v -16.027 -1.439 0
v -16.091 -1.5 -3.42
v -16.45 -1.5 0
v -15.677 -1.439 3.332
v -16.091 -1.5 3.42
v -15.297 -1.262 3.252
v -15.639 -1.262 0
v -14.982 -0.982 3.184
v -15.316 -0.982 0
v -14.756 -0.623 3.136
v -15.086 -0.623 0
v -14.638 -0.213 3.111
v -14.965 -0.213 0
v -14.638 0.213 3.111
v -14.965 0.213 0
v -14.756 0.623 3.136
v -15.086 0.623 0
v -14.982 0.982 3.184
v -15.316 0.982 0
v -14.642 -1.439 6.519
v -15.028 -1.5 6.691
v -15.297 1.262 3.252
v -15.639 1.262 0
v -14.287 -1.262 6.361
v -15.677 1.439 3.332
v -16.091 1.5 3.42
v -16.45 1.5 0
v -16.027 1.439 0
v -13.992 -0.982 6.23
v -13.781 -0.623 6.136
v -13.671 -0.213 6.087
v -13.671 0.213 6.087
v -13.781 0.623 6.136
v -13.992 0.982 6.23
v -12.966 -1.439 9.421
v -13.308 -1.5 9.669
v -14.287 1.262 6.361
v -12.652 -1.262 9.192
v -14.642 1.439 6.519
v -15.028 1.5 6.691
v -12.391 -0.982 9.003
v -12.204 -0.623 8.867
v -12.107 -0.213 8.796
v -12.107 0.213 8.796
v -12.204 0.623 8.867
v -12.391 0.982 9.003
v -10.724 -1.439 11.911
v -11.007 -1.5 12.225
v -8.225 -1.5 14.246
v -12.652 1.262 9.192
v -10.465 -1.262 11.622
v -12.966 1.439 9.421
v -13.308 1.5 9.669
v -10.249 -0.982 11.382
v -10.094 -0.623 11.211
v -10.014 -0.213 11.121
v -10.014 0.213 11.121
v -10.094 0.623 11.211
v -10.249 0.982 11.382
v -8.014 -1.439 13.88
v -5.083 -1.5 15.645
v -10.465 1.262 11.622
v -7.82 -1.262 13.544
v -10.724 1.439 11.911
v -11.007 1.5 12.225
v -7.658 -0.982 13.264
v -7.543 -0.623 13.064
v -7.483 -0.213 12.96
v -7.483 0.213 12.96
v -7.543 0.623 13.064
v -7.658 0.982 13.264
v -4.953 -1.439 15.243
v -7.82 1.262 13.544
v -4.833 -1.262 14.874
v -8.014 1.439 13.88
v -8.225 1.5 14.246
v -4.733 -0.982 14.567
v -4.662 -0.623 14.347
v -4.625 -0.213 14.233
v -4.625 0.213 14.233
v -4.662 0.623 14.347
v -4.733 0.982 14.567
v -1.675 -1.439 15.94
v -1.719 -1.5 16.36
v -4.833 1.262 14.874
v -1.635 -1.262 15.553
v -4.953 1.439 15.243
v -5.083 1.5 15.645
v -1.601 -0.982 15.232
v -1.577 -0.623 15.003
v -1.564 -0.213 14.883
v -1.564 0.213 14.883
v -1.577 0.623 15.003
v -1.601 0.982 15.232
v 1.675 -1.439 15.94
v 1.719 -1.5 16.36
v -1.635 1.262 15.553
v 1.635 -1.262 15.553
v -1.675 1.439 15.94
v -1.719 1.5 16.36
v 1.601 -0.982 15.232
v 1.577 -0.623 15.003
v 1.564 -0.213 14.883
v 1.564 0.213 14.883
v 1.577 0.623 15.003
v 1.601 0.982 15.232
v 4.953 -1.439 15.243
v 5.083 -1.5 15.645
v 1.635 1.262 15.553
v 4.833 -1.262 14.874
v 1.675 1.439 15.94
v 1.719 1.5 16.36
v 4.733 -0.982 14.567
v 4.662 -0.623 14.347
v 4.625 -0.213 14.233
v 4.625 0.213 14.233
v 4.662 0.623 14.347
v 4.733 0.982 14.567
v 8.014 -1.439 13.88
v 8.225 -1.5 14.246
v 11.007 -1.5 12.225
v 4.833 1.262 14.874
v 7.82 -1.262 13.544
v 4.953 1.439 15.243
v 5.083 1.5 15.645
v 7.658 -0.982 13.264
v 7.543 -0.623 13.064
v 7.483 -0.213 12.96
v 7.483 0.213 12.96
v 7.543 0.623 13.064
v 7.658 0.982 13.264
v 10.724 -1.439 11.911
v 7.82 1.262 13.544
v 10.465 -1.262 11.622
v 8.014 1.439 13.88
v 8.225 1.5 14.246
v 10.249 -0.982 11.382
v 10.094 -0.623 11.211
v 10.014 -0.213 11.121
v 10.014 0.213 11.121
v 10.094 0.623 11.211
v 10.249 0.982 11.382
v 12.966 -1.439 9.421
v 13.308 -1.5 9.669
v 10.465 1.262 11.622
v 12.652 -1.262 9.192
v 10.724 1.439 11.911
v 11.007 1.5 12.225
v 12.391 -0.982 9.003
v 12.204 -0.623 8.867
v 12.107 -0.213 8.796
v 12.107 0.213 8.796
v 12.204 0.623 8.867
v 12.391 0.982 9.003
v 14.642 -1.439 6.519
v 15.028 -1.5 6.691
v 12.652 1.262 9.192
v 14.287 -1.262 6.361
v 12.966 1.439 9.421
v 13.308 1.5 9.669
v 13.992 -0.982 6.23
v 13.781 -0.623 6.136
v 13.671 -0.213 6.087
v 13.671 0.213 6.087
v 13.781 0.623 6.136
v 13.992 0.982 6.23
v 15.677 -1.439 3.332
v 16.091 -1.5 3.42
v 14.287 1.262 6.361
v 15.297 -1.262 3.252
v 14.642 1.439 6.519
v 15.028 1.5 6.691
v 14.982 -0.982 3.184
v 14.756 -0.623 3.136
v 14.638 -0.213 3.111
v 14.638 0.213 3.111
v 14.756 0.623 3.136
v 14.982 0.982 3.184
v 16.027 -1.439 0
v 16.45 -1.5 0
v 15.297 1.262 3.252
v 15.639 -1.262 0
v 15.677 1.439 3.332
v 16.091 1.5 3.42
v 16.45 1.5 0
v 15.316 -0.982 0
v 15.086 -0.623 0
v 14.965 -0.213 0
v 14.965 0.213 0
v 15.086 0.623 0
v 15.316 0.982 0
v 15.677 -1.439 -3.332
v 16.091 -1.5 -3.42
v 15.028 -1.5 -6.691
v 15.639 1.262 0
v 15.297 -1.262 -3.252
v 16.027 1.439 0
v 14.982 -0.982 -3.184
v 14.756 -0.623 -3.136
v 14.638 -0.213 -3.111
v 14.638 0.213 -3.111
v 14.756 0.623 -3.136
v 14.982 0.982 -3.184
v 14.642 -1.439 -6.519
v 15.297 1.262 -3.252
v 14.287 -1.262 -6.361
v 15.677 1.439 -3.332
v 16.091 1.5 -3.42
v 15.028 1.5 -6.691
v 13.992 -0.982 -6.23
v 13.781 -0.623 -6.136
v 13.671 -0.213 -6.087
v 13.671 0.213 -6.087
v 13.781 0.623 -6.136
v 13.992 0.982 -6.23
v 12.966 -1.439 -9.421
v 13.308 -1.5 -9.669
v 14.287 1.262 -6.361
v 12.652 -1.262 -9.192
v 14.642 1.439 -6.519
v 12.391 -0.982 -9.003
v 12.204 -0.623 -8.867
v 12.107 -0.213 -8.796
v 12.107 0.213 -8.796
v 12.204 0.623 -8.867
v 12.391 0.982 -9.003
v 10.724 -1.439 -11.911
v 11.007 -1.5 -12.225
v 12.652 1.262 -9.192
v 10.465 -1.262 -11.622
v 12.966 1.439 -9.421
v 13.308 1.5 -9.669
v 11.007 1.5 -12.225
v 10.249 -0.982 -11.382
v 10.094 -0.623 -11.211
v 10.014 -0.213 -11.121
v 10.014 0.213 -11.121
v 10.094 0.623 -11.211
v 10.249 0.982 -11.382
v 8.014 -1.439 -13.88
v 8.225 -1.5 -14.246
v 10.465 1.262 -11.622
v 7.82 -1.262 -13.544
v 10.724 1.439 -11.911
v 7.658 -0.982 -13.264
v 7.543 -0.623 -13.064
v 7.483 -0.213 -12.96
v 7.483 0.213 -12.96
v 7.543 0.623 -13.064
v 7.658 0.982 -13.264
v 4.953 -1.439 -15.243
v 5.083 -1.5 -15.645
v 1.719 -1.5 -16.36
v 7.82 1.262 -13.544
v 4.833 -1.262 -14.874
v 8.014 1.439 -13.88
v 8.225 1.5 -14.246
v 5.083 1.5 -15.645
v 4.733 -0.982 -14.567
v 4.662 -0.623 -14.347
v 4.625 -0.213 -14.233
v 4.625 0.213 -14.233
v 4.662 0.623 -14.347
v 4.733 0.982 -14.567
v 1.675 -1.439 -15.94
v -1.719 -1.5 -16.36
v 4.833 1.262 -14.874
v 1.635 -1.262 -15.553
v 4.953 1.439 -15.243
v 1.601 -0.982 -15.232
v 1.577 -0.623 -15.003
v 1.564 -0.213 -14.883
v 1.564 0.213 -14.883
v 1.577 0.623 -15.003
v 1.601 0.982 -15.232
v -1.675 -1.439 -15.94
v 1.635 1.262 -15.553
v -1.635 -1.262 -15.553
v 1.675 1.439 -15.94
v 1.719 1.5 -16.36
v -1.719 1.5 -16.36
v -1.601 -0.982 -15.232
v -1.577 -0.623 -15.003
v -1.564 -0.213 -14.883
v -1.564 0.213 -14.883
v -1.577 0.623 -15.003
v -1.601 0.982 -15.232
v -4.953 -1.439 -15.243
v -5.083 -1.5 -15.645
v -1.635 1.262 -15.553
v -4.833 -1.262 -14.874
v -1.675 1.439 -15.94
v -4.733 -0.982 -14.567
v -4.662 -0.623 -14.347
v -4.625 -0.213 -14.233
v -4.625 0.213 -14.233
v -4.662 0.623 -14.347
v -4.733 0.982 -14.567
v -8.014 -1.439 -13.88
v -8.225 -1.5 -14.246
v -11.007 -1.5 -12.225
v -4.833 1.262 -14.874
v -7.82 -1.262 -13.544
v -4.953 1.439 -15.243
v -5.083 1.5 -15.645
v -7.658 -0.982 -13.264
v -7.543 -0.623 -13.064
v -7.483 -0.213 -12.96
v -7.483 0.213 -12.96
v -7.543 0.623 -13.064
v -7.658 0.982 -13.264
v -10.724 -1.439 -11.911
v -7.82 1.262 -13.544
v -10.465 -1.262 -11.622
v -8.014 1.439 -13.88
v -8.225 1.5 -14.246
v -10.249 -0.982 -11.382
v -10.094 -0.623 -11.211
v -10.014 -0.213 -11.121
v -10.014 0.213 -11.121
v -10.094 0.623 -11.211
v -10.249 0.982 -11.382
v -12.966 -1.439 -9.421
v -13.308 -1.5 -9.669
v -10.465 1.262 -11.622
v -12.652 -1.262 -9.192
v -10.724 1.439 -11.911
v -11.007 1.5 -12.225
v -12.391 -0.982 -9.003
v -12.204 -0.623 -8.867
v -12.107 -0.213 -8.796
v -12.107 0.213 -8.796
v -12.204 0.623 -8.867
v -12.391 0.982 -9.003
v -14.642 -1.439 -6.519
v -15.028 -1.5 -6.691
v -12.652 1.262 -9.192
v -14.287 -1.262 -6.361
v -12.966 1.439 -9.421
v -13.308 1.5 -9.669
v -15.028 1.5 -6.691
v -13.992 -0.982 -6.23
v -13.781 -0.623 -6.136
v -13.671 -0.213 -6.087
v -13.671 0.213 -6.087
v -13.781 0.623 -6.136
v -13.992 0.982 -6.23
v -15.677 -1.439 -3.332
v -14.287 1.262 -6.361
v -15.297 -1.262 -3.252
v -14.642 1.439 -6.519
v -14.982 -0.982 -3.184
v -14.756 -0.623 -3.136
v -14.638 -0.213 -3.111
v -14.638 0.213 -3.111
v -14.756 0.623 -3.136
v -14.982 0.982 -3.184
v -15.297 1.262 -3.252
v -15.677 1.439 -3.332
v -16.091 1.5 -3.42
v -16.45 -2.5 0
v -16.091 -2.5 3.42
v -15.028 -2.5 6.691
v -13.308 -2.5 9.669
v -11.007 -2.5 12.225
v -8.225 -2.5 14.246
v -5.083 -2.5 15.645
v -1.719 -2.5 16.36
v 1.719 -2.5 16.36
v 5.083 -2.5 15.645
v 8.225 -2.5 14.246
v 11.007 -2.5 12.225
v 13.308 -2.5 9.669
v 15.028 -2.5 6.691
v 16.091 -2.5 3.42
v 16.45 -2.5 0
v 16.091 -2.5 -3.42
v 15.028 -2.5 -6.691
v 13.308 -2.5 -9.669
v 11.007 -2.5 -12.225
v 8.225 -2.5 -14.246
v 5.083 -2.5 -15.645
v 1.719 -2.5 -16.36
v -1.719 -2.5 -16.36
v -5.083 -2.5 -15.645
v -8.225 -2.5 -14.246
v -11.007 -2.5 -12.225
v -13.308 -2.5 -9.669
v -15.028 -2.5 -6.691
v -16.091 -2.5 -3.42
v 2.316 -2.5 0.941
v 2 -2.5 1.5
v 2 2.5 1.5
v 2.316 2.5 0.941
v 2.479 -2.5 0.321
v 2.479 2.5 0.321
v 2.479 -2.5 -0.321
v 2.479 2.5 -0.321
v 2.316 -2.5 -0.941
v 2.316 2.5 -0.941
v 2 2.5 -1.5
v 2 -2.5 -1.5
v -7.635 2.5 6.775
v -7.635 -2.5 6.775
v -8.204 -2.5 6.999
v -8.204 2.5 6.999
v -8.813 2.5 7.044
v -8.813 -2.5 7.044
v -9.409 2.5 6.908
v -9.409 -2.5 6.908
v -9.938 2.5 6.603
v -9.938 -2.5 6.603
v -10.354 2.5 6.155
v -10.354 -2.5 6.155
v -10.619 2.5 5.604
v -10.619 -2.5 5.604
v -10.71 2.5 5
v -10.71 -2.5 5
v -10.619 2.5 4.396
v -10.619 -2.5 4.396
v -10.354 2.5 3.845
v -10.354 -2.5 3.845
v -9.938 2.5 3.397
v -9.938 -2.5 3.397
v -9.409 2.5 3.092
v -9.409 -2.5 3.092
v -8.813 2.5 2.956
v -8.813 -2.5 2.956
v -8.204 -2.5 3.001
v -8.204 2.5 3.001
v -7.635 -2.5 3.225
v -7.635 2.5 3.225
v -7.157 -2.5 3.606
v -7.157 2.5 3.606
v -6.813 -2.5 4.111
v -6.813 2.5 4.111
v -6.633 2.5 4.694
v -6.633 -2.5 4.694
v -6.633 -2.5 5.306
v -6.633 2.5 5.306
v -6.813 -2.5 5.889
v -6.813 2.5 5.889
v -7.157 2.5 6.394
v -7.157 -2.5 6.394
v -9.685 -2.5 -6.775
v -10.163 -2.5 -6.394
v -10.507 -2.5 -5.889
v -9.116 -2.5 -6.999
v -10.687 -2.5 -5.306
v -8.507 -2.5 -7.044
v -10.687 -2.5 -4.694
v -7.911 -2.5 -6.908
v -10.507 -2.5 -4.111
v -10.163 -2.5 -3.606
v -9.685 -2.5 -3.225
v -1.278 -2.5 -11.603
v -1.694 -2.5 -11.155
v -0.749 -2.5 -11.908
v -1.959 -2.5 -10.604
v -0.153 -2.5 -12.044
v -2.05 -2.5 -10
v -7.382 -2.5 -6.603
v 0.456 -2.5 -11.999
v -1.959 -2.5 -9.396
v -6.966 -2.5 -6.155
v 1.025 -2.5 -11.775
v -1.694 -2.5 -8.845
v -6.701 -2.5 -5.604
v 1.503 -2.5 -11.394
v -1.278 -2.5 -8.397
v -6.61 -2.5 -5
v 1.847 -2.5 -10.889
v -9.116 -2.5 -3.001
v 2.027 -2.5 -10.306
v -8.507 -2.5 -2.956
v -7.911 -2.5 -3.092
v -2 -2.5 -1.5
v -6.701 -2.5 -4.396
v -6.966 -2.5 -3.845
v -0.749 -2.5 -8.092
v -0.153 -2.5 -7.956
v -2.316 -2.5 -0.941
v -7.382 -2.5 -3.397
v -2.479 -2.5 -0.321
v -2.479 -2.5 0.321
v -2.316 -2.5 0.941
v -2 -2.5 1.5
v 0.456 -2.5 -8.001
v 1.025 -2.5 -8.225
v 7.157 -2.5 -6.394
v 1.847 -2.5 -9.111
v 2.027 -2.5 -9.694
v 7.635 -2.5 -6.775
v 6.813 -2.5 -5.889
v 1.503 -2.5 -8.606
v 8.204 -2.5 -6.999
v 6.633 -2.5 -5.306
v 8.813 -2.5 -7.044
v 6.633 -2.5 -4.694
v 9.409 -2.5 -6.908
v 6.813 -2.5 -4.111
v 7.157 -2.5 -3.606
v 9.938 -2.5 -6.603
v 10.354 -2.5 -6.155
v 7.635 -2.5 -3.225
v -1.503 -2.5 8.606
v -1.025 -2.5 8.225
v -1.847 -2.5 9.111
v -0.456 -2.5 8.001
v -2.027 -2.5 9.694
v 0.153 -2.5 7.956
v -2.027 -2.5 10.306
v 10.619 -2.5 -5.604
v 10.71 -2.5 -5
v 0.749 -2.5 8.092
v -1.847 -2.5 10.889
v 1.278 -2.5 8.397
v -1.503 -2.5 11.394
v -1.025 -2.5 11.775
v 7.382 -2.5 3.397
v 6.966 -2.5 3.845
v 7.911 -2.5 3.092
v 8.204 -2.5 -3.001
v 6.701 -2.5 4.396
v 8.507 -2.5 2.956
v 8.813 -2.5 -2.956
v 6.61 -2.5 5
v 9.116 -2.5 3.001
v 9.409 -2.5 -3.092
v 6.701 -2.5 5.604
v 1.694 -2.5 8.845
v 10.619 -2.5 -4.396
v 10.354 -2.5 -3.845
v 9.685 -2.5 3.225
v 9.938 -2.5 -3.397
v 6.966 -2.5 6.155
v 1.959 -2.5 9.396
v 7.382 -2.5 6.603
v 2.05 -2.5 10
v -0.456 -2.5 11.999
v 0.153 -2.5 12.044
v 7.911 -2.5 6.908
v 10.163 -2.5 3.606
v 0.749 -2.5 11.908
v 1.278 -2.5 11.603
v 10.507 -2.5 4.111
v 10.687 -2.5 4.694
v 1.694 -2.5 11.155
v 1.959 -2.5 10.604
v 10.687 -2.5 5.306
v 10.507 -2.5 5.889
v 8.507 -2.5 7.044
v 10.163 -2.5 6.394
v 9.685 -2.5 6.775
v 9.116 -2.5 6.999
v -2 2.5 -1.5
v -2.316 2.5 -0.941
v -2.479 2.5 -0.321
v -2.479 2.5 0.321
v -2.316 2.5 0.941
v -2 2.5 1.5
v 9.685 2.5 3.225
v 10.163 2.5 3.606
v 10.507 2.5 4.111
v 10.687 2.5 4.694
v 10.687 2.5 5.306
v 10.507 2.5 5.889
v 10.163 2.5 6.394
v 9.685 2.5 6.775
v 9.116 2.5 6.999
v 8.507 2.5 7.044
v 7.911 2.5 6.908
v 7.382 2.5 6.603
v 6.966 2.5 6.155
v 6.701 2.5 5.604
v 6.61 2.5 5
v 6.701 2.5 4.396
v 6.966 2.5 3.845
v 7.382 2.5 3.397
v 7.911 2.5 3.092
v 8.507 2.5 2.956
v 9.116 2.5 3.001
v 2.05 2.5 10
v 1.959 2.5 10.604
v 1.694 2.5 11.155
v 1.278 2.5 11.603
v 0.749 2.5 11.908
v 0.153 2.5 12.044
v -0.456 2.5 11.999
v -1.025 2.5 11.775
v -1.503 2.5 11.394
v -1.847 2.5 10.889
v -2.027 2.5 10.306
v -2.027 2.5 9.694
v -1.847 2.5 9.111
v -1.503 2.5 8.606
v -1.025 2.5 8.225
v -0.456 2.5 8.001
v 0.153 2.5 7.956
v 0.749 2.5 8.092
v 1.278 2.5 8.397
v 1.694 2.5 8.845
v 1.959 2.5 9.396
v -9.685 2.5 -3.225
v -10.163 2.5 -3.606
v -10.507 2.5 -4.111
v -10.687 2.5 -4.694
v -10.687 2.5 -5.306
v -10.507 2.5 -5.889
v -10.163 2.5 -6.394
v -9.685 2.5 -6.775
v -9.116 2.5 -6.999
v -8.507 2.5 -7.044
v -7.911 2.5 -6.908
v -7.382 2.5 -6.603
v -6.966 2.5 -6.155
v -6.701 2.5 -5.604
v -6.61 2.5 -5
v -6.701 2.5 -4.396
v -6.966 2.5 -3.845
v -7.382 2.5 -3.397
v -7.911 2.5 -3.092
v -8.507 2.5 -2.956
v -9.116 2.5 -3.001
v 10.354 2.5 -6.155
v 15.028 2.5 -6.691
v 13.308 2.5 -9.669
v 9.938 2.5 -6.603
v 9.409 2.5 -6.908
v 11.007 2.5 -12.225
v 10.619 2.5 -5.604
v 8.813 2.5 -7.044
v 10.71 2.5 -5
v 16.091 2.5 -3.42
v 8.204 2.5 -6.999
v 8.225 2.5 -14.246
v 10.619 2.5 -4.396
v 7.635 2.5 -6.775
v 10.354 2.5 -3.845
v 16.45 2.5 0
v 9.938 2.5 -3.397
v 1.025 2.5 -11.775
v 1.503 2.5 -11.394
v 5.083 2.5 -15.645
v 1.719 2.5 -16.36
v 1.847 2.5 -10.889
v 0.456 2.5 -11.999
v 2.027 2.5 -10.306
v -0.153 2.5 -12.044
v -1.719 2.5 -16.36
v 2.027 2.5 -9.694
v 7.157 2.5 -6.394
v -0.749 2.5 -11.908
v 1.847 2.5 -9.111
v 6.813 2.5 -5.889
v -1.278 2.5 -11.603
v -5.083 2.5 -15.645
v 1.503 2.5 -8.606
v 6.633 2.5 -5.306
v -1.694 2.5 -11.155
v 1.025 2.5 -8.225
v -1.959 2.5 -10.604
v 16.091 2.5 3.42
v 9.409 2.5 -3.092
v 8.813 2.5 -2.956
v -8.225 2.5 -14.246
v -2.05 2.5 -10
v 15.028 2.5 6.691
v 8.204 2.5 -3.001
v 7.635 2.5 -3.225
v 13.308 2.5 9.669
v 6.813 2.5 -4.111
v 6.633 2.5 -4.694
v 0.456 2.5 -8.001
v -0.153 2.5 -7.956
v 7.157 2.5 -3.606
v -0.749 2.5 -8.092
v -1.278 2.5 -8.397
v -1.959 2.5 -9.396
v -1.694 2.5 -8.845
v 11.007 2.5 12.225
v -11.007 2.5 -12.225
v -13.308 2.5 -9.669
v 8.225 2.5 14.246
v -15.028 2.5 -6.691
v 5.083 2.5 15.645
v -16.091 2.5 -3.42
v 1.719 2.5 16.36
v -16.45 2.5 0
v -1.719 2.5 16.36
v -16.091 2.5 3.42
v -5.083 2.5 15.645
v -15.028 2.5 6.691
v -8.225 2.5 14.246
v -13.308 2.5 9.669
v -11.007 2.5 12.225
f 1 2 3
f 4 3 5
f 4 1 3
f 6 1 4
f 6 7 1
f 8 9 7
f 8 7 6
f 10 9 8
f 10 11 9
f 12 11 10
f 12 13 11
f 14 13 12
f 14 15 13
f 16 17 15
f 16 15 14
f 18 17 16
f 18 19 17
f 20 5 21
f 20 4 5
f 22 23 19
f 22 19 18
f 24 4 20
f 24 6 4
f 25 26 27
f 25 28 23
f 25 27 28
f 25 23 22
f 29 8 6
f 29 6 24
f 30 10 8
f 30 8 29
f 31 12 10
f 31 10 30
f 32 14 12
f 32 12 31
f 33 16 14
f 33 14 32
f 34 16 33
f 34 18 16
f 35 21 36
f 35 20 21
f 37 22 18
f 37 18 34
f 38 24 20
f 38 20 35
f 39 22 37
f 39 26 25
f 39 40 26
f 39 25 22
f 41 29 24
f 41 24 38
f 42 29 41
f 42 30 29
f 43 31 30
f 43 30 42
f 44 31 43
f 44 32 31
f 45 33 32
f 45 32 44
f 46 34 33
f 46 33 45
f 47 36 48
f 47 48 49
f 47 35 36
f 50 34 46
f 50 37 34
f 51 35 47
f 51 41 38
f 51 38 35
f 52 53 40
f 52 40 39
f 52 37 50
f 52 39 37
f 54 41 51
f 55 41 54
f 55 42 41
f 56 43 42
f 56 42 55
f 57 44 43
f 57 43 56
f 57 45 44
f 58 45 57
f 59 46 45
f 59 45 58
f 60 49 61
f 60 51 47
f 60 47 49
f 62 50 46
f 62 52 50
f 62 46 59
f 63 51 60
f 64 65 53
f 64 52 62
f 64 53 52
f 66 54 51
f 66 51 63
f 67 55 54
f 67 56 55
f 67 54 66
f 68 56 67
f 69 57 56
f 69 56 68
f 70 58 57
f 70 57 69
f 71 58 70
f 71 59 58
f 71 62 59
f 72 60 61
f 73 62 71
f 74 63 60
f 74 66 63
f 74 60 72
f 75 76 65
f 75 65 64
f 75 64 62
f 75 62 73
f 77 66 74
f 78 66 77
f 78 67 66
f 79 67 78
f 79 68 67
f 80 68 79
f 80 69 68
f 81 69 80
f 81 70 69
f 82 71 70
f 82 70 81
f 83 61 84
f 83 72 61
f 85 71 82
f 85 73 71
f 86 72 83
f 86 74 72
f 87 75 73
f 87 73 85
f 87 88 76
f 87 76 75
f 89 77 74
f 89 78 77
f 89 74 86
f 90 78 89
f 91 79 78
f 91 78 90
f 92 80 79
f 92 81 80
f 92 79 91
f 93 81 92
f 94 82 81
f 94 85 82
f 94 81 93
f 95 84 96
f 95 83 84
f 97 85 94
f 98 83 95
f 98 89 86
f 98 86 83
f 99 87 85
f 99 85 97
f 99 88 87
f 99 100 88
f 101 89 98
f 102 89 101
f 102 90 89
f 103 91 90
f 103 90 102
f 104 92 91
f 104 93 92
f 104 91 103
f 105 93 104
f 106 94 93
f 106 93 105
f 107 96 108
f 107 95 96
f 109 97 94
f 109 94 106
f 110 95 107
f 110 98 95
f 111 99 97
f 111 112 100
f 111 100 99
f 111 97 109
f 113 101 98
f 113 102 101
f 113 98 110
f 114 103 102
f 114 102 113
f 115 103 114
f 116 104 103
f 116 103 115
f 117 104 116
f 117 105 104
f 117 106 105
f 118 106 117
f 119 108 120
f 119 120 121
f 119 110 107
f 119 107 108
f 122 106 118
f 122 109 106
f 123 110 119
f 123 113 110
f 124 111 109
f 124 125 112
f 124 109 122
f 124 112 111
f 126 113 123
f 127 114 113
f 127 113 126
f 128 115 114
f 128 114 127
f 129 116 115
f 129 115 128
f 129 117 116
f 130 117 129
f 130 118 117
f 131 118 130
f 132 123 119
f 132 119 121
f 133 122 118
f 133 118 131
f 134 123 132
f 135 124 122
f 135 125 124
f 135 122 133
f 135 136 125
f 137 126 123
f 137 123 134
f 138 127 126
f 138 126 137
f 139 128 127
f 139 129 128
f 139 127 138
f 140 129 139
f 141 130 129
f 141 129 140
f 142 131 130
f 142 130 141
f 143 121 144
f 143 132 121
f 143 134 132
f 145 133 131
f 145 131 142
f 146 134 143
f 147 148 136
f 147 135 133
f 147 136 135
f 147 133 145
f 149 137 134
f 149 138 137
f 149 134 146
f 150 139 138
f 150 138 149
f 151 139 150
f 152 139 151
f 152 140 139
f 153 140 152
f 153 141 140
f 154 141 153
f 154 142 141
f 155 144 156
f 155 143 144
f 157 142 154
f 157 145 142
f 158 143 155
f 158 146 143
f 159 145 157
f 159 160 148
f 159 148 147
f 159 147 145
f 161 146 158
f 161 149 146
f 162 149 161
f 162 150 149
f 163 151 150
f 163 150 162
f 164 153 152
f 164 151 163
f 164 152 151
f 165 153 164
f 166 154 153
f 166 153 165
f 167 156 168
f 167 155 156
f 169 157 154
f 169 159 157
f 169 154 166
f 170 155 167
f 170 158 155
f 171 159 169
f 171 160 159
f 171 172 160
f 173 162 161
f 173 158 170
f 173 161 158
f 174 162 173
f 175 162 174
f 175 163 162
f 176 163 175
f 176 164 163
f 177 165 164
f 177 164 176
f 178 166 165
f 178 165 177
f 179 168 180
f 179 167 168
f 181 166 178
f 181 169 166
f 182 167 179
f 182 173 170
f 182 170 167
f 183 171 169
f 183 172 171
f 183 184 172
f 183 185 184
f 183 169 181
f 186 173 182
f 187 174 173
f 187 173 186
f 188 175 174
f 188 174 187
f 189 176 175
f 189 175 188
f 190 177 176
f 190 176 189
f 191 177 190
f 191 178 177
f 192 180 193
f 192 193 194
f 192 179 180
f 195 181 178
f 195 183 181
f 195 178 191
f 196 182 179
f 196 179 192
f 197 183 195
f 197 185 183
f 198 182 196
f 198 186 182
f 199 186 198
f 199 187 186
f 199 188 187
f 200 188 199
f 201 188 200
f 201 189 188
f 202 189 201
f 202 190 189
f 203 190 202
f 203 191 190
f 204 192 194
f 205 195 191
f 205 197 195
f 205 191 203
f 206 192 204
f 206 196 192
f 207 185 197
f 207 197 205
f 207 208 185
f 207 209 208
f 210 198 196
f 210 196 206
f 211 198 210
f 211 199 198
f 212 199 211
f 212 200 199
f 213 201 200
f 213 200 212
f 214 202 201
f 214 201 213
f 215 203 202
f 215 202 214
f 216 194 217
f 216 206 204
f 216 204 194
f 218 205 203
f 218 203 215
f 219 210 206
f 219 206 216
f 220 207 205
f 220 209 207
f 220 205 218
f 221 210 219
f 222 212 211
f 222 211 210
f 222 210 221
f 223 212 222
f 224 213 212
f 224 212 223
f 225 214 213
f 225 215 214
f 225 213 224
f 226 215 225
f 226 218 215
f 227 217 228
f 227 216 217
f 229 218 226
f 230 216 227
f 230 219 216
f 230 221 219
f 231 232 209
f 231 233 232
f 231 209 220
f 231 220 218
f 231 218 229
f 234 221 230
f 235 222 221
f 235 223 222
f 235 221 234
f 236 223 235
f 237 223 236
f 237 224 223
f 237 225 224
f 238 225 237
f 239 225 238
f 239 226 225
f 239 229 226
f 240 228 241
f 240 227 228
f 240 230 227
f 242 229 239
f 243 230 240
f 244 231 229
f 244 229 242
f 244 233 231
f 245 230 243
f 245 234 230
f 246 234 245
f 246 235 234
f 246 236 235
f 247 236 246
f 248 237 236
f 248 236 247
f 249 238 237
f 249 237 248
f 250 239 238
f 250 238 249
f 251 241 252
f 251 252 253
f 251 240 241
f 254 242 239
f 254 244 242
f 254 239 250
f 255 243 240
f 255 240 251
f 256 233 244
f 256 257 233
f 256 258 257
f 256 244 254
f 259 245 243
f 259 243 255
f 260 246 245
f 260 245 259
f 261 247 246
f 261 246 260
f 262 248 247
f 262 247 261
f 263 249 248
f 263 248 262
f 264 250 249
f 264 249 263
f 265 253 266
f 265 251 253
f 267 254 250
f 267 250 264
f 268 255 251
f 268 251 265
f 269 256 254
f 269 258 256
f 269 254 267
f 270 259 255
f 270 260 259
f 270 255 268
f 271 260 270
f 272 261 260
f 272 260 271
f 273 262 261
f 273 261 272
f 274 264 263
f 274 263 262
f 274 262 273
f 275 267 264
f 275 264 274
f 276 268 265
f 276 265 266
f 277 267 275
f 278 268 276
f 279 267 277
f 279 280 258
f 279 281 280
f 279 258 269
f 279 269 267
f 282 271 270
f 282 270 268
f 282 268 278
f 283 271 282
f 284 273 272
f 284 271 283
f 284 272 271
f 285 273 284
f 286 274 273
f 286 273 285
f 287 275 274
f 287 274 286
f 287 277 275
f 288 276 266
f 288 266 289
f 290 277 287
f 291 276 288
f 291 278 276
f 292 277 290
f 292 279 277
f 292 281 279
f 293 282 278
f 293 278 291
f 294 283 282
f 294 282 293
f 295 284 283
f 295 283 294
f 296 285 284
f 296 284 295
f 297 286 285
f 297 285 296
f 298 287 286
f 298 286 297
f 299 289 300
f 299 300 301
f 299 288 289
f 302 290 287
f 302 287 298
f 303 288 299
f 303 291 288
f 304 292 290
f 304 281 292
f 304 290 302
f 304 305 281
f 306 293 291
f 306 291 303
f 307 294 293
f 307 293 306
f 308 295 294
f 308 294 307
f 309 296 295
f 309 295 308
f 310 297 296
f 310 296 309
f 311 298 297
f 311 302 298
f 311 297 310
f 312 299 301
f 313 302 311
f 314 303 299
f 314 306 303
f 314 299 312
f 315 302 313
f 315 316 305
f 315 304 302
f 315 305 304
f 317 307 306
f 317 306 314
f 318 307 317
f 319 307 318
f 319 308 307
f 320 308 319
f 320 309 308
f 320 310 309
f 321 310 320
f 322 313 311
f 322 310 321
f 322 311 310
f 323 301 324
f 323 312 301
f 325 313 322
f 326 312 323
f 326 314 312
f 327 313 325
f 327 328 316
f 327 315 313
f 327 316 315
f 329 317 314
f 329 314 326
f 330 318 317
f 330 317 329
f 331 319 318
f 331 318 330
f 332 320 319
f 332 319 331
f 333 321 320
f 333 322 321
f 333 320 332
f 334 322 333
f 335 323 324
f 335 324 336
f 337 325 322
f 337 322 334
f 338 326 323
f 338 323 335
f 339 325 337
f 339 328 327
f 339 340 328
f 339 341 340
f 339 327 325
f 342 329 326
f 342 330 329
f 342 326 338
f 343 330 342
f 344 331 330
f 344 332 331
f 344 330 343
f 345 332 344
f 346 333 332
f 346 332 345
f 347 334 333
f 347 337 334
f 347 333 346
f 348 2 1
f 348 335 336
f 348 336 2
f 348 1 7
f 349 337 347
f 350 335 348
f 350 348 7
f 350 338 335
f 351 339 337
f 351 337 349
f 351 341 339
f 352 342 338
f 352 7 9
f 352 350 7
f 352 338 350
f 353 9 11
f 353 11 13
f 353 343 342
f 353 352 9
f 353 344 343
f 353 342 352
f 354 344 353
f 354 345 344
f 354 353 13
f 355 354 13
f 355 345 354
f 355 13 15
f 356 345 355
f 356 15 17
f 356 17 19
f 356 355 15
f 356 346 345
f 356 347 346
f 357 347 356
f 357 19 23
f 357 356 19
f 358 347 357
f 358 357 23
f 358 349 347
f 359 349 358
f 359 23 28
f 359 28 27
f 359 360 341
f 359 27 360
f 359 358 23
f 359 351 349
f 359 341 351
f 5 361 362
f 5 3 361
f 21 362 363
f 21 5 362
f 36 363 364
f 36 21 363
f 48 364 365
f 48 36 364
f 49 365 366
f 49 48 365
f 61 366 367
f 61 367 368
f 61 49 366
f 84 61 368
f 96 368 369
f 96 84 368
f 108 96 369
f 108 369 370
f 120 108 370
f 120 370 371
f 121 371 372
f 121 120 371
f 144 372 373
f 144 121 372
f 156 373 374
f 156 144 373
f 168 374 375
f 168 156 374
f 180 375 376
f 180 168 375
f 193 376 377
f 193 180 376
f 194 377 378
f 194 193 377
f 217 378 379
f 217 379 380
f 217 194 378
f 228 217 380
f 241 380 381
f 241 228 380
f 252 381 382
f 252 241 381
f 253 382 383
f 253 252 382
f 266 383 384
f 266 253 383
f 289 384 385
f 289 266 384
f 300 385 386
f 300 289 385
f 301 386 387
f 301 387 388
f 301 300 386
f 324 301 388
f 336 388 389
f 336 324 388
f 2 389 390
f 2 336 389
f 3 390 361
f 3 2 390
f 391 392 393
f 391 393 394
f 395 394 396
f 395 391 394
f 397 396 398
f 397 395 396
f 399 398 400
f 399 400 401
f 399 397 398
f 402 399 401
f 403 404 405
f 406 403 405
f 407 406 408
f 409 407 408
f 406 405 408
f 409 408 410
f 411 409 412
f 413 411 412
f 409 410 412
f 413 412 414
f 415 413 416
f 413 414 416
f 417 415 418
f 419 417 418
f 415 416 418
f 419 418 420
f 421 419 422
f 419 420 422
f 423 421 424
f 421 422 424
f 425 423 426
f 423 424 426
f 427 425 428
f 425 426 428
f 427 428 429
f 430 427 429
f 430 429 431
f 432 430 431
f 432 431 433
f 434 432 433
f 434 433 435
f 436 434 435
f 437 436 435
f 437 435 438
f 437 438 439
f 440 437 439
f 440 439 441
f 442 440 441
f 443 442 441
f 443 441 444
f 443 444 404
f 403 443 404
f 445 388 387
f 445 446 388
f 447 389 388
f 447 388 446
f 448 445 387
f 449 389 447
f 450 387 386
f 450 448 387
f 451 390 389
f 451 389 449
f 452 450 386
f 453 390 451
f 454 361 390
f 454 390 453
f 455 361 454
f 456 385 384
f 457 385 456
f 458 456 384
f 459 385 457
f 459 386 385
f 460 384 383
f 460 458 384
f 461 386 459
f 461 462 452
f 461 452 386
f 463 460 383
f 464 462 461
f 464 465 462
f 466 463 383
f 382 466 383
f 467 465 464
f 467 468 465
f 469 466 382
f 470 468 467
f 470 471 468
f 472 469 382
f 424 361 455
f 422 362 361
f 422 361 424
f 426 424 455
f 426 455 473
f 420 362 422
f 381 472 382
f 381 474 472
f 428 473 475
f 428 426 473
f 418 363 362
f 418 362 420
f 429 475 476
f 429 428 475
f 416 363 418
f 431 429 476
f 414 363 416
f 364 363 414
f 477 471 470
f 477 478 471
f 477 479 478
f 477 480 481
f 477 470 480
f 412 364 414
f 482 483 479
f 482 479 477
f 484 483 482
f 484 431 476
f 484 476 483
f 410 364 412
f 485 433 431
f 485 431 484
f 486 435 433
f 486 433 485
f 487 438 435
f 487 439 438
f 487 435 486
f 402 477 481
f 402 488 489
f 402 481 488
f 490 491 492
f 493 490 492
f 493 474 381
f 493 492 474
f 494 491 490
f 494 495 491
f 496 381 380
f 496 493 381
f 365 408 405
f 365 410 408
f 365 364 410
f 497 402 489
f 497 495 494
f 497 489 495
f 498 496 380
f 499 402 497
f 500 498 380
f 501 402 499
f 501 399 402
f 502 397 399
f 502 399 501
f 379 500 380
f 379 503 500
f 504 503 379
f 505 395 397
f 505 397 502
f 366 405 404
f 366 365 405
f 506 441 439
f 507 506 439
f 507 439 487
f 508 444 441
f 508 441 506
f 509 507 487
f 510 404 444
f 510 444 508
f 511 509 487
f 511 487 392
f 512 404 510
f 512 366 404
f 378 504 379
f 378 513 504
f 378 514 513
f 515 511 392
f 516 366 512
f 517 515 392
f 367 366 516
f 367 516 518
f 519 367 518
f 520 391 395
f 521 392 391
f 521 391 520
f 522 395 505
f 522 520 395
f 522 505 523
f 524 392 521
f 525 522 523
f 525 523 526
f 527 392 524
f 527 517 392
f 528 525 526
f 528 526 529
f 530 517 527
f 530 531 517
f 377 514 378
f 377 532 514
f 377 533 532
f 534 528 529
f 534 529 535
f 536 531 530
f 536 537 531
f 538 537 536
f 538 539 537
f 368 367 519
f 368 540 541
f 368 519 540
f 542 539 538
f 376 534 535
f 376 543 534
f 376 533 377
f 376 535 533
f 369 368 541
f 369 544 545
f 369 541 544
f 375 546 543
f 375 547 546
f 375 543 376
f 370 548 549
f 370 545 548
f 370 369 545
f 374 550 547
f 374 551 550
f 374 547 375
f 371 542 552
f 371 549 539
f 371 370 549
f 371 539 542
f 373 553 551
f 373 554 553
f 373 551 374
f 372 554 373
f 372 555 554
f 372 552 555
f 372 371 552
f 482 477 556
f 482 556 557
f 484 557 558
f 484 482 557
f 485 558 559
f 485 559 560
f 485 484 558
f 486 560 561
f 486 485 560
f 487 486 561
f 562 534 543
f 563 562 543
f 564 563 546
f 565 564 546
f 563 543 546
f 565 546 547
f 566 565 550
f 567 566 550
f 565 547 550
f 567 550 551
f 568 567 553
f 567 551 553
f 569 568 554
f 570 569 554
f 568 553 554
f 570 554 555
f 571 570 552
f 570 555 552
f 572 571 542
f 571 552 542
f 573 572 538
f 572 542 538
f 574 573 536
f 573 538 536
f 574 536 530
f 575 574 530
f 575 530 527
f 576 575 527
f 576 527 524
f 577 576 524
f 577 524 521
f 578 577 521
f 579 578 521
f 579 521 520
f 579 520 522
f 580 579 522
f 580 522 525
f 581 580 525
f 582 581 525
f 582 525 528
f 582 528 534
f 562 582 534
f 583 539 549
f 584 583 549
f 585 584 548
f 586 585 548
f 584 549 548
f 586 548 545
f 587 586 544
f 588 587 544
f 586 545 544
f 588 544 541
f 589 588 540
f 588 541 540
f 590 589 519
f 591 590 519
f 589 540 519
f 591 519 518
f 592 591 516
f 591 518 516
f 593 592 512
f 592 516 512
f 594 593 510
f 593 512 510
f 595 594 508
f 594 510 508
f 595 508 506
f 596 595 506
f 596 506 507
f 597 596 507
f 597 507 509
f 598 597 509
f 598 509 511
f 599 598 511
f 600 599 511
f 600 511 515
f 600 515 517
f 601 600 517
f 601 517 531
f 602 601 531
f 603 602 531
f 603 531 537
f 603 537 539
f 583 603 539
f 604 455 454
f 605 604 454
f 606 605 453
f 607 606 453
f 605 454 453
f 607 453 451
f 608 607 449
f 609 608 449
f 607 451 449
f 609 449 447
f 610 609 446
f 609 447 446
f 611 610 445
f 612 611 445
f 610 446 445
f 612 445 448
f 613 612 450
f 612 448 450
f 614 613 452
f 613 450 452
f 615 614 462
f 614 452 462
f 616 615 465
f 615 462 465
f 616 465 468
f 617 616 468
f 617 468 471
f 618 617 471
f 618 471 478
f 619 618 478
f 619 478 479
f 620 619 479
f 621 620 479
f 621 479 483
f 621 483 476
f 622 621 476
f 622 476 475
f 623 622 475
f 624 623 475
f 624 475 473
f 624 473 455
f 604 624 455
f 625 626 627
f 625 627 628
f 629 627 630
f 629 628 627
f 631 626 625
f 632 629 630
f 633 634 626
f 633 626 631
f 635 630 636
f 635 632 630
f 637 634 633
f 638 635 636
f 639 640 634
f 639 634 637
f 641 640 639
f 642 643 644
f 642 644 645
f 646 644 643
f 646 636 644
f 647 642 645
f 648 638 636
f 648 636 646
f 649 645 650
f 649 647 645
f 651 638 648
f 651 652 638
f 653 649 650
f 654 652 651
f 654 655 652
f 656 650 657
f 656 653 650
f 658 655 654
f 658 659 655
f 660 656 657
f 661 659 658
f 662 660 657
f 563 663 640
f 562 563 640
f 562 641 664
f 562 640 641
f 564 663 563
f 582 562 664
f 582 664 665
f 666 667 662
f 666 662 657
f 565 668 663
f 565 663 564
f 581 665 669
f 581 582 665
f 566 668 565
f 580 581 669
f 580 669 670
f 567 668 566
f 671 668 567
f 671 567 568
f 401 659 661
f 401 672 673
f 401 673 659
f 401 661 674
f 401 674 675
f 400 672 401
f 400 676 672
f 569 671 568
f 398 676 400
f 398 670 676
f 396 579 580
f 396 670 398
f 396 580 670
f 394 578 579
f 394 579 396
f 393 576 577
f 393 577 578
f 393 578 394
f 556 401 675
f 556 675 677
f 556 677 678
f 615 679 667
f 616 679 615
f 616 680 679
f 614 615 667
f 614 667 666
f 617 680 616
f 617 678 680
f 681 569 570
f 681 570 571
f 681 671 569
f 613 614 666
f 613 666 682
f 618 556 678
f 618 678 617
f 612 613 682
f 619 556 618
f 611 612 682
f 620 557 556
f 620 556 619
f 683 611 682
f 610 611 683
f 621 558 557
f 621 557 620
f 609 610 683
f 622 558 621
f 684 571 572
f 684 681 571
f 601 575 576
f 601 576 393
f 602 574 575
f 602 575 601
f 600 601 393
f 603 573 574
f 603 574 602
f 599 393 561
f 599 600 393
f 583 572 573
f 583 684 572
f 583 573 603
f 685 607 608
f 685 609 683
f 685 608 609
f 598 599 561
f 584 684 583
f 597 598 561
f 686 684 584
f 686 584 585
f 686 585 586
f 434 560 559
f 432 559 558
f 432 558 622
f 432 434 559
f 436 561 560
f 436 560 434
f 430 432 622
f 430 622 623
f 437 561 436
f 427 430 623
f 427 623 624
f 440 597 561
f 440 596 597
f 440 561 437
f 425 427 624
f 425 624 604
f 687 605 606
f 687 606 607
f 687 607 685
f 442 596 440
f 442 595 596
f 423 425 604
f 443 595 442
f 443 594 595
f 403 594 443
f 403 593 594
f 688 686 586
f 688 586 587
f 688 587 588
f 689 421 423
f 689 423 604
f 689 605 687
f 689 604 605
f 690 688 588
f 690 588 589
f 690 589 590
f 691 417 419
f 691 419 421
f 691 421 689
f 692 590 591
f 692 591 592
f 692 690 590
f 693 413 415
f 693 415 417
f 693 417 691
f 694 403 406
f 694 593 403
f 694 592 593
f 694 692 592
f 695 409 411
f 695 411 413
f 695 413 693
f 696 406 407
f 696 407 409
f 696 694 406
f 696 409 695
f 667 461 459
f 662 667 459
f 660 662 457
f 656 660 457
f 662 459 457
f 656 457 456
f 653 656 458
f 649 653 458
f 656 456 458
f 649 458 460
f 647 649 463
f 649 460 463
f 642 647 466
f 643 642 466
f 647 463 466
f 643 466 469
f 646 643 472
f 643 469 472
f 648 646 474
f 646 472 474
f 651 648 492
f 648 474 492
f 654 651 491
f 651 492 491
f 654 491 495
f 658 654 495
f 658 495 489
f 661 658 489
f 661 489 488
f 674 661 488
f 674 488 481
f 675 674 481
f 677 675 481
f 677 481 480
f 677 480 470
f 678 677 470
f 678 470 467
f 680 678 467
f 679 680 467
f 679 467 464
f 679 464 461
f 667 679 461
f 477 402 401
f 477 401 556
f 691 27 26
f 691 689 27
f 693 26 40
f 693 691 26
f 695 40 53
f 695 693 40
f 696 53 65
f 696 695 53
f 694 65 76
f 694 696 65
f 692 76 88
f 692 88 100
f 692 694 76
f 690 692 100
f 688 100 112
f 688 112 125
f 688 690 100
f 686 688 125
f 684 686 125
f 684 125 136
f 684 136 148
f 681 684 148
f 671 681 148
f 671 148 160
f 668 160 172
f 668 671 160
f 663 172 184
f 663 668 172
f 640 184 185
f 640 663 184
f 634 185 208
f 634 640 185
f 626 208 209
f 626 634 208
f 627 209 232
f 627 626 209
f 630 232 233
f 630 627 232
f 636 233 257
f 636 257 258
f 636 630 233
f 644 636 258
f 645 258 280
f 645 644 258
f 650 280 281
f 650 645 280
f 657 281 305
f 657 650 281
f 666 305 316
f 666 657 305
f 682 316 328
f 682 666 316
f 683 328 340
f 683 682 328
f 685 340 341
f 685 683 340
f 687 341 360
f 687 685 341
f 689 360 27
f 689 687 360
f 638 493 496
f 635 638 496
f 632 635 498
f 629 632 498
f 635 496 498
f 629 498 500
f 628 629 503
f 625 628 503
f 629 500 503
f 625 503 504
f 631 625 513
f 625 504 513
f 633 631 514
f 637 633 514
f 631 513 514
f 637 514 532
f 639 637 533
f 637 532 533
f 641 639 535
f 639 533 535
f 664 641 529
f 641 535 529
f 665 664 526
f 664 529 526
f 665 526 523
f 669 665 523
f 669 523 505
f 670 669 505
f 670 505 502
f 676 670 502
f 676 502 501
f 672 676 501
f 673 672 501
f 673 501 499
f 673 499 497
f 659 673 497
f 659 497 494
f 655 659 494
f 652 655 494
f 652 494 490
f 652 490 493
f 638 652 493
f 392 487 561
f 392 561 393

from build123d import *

# Parameters (mm, degrees)
SKETCH001_R        = 2.05
POCKET_DEPTH       = 98.592026
POLARPATTERN_COUNT = 6
PAD_DEPTH          = 5


with BuildPart() as part:
    # Sketch → Revolution (revolve)
    with BuildSketch(Plane.XY):
        with BuildLine():
            Line((-2.5, 2.5), (-2.5, -2.5))
            Line((-2.5, -2.5), (-16.45, -2.5))
            Line((-16.45, -2.5), (-16.45, -1.5))
            ThreePointArc((-16.45, -1.5), (-14.95, 0), (-16.45, 1.5))
            Line((-16.45, 1.5), (-16.45, 2.5))
            Line((-16.45, 2.5), (-2.5, 2.5))
        make_face()
    revolve(axis=Axis((0, 0, 0), (0, 1, 0)))

    # Sketch001 → Pocket (cut, through all)
    with BuildSketch(Plane.XZ.offset(2.5)):
        with Locations((0, 10)):
            Circle(SKETCH001_R)
    pocket = extrude(amount=-POCKET_DEPTH, mode=Mode.SUBTRACT)

    # PolarPattern: Pocket ×6 about axis
    polarpattern_axis = Axis((0, -2.5, 0), (0, -1, 0))
    for i in range(1, POLARPATTERN_COUNT):
        add(pocket.rotate(polarpattern_axis, i * 360 / POLARPATTERN_COUNT), mode=Mode.SUBTRACT)

    # Sketch002 → Pad (new body)
    with BuildSketch(Plane.XZ.offset(2.5)):
        with BuildLine():
            Line((-2, 1.5), (2, 1.5))
            ThreePointArc((2, 1.5), (0, 2.5), (-2, 1.5))
        make_face()
        with BuildLine():
            Line((2, -1.5), (-2, -1.5))
            ThreePointArc((-2, -1.5), (0, -2.5), (2, -1.5))
        make_face()
    extrude(amount=-PAD_DEPTH)


solid = part.part
